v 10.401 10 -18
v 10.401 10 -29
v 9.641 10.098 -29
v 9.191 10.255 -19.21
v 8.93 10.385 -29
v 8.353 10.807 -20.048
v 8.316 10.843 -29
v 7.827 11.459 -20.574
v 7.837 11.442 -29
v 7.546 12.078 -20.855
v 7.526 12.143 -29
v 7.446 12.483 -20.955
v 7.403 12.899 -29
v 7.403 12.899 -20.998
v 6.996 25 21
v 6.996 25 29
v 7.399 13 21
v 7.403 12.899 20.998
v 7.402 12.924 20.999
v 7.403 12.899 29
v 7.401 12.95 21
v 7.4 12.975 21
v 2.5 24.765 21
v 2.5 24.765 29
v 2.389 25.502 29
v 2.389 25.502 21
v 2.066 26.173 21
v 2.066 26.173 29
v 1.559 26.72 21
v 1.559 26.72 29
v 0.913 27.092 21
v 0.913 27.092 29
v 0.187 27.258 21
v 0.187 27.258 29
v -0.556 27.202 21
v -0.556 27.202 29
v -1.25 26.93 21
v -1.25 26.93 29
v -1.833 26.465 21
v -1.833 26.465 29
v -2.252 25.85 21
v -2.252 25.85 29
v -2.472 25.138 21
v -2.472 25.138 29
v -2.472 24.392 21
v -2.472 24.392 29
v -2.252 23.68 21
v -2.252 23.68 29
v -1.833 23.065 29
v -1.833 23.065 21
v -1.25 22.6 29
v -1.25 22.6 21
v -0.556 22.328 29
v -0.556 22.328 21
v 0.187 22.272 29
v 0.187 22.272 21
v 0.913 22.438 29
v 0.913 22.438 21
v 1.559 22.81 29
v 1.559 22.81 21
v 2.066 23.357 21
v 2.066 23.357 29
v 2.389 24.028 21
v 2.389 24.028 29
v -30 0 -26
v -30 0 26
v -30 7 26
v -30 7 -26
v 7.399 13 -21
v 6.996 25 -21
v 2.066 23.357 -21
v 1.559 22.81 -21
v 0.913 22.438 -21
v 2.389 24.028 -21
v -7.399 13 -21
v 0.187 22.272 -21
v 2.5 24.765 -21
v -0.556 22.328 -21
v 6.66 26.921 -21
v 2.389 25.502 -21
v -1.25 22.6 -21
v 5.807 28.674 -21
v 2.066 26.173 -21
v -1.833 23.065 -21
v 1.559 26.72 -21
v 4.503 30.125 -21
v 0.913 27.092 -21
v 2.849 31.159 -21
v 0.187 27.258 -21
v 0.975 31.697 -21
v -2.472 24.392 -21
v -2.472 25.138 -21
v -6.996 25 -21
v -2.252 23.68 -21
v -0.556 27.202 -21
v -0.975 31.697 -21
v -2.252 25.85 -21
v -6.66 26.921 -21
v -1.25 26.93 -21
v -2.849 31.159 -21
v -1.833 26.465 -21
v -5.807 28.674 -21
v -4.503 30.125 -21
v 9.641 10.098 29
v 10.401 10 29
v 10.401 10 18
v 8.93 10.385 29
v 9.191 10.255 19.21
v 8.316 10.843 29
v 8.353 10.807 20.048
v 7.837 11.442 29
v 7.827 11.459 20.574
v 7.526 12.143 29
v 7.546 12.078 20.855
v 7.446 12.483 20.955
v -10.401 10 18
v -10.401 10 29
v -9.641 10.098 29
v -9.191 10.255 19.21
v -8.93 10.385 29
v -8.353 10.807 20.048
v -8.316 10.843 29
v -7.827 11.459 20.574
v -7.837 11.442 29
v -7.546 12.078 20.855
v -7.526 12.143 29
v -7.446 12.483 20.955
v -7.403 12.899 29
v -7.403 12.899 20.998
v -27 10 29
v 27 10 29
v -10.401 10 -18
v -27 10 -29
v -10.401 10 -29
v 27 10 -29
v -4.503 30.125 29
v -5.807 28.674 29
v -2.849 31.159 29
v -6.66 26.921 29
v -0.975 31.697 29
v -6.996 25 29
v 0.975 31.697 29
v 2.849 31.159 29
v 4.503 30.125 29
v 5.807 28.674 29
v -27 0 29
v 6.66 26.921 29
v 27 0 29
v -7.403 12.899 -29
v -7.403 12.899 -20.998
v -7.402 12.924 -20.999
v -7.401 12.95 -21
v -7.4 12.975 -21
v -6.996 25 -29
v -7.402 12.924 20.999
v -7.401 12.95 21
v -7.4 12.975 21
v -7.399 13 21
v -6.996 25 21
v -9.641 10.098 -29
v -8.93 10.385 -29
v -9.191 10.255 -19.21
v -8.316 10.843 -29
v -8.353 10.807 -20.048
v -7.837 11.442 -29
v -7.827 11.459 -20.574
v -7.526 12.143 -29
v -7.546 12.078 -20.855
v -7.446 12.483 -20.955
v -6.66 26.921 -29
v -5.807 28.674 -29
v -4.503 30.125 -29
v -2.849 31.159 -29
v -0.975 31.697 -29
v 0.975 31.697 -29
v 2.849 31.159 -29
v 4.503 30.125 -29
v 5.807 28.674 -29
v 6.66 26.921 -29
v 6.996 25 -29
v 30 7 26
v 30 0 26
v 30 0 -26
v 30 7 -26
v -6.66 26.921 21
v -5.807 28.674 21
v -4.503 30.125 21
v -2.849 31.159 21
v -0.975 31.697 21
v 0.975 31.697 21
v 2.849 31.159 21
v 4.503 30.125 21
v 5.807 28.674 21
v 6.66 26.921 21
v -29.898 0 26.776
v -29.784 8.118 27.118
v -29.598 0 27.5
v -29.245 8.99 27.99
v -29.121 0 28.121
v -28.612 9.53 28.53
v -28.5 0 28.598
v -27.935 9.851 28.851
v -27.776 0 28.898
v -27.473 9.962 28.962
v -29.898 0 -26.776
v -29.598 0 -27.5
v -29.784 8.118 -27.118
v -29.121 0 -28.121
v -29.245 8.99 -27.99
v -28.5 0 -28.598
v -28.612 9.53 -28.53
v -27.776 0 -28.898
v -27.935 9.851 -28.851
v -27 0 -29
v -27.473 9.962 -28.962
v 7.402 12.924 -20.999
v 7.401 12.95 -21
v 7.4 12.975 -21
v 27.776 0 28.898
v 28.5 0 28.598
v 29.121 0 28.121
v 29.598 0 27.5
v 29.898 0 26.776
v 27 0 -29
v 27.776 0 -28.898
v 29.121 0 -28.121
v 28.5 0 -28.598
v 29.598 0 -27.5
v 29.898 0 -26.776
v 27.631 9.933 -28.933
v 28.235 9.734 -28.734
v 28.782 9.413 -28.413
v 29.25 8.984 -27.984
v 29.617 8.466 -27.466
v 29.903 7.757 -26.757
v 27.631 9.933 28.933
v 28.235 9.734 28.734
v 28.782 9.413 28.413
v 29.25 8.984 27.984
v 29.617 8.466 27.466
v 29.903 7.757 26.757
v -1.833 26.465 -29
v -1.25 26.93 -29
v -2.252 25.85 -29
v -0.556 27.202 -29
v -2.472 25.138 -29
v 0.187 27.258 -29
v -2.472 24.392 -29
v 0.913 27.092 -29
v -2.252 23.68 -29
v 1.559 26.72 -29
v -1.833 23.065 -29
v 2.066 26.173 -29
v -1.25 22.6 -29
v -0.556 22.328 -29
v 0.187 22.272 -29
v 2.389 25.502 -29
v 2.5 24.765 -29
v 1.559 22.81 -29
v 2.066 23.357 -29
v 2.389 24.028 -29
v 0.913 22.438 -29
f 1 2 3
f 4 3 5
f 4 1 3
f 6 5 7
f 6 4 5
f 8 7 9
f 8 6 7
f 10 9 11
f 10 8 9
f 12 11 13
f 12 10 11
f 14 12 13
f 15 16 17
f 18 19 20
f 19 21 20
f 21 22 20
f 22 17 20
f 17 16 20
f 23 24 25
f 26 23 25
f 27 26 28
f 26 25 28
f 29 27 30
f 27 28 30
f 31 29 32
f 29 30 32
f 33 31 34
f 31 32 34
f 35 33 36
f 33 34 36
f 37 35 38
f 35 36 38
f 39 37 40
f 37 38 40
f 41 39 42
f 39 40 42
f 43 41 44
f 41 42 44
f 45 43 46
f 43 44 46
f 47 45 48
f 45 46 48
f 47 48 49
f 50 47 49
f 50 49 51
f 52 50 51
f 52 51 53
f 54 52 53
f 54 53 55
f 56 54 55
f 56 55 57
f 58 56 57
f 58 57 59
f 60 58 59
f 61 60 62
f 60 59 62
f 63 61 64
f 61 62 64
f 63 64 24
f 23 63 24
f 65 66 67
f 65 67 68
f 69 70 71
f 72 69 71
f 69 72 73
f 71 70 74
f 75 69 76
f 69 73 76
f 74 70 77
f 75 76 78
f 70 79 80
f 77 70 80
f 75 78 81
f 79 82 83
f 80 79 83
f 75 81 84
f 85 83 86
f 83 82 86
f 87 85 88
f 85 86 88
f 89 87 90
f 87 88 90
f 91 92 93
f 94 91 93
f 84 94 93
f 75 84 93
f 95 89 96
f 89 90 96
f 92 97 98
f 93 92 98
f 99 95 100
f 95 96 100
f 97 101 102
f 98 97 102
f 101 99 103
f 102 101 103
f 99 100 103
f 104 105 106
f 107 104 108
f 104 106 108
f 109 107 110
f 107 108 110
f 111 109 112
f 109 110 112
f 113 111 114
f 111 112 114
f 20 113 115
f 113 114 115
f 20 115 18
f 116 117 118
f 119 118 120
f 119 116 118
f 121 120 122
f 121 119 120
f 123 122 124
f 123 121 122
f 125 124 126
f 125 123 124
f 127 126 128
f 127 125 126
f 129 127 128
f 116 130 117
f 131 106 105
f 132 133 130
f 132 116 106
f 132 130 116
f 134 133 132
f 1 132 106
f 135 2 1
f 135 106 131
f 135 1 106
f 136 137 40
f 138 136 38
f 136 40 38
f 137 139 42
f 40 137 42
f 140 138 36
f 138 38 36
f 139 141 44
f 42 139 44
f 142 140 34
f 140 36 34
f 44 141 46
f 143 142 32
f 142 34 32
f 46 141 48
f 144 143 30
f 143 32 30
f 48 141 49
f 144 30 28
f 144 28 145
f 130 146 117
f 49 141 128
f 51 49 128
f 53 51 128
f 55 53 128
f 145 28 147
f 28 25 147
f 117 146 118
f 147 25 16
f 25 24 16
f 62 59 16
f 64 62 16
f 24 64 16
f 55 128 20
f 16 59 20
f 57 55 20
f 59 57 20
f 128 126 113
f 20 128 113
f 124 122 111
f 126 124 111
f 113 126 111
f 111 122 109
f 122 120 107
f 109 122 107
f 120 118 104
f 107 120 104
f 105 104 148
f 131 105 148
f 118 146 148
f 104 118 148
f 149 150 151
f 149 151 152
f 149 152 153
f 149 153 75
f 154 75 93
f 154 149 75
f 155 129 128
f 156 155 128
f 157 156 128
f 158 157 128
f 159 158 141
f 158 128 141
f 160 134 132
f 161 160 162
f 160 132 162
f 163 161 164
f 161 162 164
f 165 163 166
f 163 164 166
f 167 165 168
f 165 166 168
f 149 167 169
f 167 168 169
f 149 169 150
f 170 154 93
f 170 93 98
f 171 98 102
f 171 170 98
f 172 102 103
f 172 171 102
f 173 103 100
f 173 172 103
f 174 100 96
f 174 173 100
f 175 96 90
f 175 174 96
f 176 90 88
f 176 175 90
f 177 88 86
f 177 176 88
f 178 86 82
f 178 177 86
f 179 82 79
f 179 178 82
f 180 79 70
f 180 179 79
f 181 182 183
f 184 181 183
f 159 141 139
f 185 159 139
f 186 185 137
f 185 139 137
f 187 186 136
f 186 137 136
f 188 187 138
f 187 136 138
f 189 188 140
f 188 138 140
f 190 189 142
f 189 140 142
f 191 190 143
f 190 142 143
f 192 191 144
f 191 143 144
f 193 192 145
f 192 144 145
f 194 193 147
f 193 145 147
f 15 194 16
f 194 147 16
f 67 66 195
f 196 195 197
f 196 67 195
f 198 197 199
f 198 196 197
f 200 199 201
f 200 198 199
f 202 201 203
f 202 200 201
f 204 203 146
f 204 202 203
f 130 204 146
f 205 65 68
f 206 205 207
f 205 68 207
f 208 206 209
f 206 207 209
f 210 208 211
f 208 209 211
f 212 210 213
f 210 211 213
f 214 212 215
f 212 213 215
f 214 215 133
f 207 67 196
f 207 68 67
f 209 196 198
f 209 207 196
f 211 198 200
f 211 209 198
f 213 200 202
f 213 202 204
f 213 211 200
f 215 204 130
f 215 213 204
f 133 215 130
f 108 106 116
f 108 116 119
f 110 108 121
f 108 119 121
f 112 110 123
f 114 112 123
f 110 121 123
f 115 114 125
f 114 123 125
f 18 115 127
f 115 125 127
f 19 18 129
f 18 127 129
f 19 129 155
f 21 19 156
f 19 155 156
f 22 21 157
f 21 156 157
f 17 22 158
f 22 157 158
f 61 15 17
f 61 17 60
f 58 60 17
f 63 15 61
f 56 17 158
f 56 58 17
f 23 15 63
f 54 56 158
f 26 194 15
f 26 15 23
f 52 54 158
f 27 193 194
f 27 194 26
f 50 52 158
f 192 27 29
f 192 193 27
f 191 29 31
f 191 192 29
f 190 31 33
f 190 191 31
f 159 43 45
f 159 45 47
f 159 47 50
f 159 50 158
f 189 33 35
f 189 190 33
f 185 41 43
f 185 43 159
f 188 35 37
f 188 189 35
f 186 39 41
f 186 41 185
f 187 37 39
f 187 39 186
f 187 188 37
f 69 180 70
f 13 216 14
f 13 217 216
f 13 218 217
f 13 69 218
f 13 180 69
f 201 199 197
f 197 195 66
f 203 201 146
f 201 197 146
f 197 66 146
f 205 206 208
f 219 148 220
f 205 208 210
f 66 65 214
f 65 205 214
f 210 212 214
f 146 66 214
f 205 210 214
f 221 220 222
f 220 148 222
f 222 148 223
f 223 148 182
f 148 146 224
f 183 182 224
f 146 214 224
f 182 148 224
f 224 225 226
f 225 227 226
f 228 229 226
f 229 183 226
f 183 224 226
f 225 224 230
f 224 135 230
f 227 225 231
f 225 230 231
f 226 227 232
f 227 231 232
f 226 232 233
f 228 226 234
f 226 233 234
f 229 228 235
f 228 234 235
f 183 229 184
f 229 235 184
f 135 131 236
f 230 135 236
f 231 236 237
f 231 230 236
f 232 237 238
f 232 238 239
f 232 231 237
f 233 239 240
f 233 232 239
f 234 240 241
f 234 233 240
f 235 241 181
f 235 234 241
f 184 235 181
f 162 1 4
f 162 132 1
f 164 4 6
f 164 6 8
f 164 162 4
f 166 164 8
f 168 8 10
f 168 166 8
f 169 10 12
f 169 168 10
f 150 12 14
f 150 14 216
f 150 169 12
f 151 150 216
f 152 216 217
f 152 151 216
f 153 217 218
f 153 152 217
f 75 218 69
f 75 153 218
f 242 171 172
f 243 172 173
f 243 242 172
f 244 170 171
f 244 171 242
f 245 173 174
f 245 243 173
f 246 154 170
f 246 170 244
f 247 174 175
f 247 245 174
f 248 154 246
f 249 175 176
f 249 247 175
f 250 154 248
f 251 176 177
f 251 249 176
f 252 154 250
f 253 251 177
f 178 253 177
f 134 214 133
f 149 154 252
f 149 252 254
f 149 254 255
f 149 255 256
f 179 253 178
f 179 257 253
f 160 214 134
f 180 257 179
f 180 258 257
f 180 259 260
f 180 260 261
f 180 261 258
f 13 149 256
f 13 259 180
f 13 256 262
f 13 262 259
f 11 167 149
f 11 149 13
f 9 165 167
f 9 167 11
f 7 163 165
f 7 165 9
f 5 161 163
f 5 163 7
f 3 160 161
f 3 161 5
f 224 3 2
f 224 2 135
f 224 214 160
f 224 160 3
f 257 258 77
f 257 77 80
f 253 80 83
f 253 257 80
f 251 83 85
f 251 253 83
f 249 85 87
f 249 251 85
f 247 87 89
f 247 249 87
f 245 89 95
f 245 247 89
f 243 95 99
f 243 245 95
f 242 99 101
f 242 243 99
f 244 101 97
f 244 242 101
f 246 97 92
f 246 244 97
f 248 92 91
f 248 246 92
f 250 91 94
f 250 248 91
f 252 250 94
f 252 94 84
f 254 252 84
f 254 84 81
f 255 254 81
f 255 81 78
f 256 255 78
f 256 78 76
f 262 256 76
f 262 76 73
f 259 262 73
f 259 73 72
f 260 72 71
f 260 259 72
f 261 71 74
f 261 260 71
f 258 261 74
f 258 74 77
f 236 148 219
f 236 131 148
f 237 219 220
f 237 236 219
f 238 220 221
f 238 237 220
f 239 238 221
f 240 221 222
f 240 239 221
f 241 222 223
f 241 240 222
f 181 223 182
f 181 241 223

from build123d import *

# Parameters (mm, degrees)
SKETCH2_W           = 60
SKETCH2_H           = 58
BOSS_EXTRUDE1_DEPTH = 10
SKETCH3_R           = 2.5
BOSS_EXTRUDE2_DEPTH = 8
FILLET1_R           = 3


with BuildPart() as part:
    # Sketch2 → Boss-Extrude1 (new body)
    with BuildSketch(Plane(origin=(0, 0, 0), x_dir=(1, 0, 0), z_dir=(0, 1, 0))):
        Rectangle(SKETCH2_W, SKETCH2_H)
    extrude(amount=BOSS_EXTRUDE1_DEPTH)

    # Sketch3 → Boss-Extrude2 (add)
    with BuildSketch(Plane.XY.offset(29)):
        with BuildLine():
            Line((-7.5, 10), (-6.996052809, 25))
            ThreePointArc((-6.996052809, 25), (0, 31.764957256), (6.996052809, 25))
            Line((6.996052809, 25), (7.5, 10))
            Line((7.5, 10), (-7.5, 10))
        make_face()
        with Locations((0, 24.764957256)):
            Circle(SKETCH3_R, mode=Mode.SUBTRACT)
    boss_extrude2 = extrude(amount=-BOSS_EXTRUDE2_DEPTH)

    # Mirror1: Boss-Extrude2 across plane
    add(boss_extrude2.mirror(Plane.XY))

    # Fillet1
    fillet1_edges = [part.edges().sort_by_distance(p)[0] for p in [
        (-30, 10, 0),
        (0, 10, 21),
        (7.5, 10, 25),
        (-7.5, 10, 25),
        (0, 10, -21),
        (-7.5, 10, -25),
        (7.5, 10, -25),
        (30, 10, 0),
        (30, 5, 29),
        (-30, 5, 29),
        (-30, 5, -29),
        (30, 5, -29),
    ]]
    fillet(fillet1_edges, radius=FILLET1_R)


solid = part.part
